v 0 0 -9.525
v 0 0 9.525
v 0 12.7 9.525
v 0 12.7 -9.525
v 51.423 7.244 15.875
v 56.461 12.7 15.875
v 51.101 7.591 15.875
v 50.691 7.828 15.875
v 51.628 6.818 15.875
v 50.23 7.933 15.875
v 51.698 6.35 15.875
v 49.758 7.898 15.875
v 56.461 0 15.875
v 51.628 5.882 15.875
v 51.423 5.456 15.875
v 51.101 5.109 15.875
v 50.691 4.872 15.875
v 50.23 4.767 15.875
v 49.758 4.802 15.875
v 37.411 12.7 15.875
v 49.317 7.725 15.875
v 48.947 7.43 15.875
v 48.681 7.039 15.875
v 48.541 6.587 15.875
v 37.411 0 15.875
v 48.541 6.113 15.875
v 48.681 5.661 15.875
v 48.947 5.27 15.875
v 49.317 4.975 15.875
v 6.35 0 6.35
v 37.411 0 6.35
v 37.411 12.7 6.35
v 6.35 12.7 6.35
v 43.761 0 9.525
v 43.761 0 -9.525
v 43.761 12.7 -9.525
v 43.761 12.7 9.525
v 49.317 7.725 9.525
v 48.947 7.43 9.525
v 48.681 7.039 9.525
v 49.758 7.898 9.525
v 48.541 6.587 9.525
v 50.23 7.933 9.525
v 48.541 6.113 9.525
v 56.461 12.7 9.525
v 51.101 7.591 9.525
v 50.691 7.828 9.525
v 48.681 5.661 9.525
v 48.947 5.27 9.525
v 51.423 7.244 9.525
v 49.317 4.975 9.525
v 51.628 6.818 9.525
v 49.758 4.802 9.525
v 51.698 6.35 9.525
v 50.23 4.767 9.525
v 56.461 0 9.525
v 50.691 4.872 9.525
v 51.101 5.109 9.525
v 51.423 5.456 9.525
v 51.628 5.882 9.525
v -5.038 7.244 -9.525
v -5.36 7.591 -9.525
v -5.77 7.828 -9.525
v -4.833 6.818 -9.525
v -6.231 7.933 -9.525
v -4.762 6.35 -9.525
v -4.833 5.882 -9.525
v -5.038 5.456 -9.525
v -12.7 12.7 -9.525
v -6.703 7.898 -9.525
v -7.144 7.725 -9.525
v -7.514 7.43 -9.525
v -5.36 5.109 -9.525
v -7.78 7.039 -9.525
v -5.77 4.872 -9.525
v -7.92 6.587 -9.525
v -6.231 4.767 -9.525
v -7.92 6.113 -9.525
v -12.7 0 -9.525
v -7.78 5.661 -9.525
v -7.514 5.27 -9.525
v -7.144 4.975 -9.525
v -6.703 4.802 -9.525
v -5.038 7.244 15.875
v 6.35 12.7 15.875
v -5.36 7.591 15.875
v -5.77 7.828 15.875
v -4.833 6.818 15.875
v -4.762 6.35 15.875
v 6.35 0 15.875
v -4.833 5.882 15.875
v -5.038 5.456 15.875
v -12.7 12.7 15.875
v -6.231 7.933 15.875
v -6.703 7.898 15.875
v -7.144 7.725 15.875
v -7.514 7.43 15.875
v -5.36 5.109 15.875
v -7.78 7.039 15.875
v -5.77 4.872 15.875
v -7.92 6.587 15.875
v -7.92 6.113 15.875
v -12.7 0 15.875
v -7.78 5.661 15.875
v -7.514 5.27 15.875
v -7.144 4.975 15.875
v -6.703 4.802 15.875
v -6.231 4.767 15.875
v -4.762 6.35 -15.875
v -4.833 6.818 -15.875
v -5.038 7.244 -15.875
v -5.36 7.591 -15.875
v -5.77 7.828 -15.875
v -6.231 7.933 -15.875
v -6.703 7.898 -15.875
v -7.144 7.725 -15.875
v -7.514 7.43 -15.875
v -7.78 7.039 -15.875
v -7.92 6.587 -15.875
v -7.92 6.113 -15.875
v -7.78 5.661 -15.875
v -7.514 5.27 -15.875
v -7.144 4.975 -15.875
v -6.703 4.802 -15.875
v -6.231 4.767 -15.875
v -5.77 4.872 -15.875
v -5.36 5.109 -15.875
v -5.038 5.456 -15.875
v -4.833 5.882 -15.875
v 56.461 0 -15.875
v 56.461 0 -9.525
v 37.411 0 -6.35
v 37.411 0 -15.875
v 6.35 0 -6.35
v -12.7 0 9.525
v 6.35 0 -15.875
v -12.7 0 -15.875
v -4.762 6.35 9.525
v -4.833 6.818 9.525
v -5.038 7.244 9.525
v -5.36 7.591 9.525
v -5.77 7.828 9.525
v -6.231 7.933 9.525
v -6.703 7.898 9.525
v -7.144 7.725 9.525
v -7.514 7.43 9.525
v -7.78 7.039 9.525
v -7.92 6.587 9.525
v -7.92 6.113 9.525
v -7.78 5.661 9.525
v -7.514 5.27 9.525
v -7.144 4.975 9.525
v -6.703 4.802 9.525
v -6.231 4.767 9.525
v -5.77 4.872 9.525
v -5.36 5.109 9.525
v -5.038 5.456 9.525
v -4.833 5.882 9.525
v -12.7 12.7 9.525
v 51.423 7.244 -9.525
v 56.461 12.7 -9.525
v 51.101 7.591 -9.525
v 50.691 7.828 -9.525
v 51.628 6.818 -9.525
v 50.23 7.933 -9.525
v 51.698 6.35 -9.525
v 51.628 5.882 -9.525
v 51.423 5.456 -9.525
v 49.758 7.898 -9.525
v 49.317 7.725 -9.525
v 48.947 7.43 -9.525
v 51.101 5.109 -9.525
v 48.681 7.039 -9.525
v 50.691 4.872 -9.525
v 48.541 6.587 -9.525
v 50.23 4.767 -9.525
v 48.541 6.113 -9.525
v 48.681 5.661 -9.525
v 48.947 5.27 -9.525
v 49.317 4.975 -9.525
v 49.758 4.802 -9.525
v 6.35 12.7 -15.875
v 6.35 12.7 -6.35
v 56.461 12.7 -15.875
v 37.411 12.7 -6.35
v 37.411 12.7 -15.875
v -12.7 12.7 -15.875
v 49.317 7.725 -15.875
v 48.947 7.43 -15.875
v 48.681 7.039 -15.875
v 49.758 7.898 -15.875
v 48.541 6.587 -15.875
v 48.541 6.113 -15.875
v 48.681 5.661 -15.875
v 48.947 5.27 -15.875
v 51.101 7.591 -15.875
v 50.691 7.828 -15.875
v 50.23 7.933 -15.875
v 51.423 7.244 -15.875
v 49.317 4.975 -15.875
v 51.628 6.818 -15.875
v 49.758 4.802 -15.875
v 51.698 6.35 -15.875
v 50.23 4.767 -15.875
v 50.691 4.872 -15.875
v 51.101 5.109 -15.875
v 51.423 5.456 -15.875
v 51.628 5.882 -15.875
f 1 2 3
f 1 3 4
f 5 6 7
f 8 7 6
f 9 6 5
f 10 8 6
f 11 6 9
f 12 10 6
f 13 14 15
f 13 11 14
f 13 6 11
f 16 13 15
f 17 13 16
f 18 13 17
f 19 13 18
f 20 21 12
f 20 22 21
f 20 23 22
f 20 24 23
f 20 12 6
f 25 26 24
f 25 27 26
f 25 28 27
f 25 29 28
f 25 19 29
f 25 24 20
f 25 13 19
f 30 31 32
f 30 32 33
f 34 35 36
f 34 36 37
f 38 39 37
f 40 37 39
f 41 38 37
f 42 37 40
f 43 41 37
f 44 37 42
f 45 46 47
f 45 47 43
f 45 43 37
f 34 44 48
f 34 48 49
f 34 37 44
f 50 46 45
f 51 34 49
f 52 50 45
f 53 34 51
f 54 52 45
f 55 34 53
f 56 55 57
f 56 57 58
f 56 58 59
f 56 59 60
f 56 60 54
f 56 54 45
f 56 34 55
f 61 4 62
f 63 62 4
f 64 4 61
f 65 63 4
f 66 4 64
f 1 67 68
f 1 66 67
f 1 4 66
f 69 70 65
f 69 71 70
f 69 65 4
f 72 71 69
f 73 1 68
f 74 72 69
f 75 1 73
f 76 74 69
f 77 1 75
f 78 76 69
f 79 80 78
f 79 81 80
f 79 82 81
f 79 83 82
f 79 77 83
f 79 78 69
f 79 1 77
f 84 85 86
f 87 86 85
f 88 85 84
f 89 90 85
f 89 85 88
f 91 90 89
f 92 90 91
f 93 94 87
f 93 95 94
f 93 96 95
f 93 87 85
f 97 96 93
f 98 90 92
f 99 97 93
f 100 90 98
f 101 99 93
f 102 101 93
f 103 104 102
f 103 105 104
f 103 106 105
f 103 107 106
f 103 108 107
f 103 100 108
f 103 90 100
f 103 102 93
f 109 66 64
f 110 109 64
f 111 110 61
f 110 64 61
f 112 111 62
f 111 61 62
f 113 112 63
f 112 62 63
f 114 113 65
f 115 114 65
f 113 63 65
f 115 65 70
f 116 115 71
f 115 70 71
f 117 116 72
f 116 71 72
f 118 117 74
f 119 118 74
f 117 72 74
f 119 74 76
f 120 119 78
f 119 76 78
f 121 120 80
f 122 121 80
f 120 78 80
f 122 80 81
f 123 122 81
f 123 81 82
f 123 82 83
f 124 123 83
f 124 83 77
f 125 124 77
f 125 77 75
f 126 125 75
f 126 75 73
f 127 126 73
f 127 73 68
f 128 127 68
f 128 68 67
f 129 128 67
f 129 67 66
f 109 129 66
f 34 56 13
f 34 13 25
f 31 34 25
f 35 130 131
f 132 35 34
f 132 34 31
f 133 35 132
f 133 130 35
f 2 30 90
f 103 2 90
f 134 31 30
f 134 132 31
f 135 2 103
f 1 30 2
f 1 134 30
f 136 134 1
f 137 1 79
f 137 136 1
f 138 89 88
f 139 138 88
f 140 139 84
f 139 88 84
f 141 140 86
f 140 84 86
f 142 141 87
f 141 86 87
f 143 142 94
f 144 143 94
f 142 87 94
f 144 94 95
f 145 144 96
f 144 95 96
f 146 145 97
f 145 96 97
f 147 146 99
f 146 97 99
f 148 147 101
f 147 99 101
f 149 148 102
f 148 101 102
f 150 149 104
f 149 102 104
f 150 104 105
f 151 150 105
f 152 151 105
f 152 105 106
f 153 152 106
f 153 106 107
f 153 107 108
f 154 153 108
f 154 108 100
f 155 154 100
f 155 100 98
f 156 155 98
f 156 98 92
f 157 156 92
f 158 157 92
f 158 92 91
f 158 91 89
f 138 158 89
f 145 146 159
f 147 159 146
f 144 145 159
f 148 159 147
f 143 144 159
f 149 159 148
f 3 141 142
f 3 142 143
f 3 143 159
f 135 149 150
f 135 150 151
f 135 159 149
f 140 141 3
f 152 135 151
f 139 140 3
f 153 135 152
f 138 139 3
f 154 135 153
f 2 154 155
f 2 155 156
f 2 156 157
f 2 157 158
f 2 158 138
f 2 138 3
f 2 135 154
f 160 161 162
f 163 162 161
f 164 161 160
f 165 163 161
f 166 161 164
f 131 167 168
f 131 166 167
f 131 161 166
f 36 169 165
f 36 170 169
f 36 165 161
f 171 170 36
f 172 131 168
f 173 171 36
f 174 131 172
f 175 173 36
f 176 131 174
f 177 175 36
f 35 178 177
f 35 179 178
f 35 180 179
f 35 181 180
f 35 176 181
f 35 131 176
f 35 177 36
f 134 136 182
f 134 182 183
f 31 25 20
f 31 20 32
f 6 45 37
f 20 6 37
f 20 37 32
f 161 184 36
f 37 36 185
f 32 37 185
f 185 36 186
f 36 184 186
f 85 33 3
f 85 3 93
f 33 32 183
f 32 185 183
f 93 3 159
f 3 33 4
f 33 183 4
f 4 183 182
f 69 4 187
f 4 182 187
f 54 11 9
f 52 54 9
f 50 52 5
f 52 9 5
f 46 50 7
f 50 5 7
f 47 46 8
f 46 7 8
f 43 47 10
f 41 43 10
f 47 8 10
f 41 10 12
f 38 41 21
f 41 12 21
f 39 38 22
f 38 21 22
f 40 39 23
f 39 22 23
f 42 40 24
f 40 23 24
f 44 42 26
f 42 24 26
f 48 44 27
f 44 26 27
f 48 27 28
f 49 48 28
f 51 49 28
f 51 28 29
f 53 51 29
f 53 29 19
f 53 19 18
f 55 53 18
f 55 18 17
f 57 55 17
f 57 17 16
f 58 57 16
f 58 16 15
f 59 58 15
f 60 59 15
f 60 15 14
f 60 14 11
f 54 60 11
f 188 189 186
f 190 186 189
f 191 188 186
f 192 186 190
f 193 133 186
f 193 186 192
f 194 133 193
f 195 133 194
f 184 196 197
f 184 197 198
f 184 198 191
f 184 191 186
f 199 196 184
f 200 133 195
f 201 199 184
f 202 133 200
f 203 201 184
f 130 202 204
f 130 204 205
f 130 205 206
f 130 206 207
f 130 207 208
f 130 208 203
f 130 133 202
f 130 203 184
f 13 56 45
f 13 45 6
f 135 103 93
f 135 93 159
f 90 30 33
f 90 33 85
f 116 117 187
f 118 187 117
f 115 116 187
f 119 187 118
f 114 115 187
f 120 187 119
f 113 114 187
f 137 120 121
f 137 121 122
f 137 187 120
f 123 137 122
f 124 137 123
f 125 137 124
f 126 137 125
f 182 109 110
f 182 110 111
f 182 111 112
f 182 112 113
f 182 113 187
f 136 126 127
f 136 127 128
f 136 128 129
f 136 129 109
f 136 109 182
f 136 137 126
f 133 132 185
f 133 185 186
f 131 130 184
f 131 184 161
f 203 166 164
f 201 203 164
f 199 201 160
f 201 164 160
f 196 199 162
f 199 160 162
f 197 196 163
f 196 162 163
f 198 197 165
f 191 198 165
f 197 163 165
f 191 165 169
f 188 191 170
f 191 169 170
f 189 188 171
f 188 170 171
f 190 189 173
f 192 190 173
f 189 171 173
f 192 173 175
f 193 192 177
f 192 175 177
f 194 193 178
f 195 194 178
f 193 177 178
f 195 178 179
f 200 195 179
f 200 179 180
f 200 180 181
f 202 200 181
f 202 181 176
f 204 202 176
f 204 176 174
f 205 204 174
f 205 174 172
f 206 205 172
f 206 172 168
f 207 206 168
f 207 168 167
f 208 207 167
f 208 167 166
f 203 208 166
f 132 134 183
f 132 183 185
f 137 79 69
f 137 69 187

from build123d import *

# Parameters (mm, degrees)
BOSS_EXTRUDE1_DEPTH = 12.7
SKETCH2_R           = 1.5875
CUT_EXTRUDE1_DEPTH  = 32.75


with BuildPart() as part:
    # Sketch1 → Boss-Extrude1 (new body)
    with BuildSketch(Plane(origin=(0, 0, 0), x_dir=(1, 0, 0), z_dir=(0, 1, 0))):
        Polygon((0, 9.525), (-12.7, 9.525), (-12.7, 15.875), (6.35, 15.875), (6.35, 6.35), (37.410945752, 6.35), (37.410945752, 15.875), (56.460945752, 15.875), (56.460945752, 9.525), (43.760945752, 9.525), (43.760945752, -9.525), (56.460945752, -9.525), (56.460945752, -15.875), (37.410945752, -15.875), (37.410945752, -6.35), (6.35, -6.35), (6.35, -15.875), (-12.7, -15.875), (-12.7, -9.525), (0, -9.525), align=None)
    extrude(amount=BOSS_EXTRUDE1_DEPTH)

    # Sketch2 → Cut-Extrude1 (cut, through all)
    with BuildSketch(Plane.XY.offset(15.875)):
        with Locations((50.110945752, 6.35)):
            Circle(SKETCH2_R)
        with Locations((-6.35, 6.35)):
            Circle(SKETCH2_R)
    extrude(amount=-CUT_EXTRUDE1_DEPTH, mode=Mode.SUBTRACT)


solid = part.part
